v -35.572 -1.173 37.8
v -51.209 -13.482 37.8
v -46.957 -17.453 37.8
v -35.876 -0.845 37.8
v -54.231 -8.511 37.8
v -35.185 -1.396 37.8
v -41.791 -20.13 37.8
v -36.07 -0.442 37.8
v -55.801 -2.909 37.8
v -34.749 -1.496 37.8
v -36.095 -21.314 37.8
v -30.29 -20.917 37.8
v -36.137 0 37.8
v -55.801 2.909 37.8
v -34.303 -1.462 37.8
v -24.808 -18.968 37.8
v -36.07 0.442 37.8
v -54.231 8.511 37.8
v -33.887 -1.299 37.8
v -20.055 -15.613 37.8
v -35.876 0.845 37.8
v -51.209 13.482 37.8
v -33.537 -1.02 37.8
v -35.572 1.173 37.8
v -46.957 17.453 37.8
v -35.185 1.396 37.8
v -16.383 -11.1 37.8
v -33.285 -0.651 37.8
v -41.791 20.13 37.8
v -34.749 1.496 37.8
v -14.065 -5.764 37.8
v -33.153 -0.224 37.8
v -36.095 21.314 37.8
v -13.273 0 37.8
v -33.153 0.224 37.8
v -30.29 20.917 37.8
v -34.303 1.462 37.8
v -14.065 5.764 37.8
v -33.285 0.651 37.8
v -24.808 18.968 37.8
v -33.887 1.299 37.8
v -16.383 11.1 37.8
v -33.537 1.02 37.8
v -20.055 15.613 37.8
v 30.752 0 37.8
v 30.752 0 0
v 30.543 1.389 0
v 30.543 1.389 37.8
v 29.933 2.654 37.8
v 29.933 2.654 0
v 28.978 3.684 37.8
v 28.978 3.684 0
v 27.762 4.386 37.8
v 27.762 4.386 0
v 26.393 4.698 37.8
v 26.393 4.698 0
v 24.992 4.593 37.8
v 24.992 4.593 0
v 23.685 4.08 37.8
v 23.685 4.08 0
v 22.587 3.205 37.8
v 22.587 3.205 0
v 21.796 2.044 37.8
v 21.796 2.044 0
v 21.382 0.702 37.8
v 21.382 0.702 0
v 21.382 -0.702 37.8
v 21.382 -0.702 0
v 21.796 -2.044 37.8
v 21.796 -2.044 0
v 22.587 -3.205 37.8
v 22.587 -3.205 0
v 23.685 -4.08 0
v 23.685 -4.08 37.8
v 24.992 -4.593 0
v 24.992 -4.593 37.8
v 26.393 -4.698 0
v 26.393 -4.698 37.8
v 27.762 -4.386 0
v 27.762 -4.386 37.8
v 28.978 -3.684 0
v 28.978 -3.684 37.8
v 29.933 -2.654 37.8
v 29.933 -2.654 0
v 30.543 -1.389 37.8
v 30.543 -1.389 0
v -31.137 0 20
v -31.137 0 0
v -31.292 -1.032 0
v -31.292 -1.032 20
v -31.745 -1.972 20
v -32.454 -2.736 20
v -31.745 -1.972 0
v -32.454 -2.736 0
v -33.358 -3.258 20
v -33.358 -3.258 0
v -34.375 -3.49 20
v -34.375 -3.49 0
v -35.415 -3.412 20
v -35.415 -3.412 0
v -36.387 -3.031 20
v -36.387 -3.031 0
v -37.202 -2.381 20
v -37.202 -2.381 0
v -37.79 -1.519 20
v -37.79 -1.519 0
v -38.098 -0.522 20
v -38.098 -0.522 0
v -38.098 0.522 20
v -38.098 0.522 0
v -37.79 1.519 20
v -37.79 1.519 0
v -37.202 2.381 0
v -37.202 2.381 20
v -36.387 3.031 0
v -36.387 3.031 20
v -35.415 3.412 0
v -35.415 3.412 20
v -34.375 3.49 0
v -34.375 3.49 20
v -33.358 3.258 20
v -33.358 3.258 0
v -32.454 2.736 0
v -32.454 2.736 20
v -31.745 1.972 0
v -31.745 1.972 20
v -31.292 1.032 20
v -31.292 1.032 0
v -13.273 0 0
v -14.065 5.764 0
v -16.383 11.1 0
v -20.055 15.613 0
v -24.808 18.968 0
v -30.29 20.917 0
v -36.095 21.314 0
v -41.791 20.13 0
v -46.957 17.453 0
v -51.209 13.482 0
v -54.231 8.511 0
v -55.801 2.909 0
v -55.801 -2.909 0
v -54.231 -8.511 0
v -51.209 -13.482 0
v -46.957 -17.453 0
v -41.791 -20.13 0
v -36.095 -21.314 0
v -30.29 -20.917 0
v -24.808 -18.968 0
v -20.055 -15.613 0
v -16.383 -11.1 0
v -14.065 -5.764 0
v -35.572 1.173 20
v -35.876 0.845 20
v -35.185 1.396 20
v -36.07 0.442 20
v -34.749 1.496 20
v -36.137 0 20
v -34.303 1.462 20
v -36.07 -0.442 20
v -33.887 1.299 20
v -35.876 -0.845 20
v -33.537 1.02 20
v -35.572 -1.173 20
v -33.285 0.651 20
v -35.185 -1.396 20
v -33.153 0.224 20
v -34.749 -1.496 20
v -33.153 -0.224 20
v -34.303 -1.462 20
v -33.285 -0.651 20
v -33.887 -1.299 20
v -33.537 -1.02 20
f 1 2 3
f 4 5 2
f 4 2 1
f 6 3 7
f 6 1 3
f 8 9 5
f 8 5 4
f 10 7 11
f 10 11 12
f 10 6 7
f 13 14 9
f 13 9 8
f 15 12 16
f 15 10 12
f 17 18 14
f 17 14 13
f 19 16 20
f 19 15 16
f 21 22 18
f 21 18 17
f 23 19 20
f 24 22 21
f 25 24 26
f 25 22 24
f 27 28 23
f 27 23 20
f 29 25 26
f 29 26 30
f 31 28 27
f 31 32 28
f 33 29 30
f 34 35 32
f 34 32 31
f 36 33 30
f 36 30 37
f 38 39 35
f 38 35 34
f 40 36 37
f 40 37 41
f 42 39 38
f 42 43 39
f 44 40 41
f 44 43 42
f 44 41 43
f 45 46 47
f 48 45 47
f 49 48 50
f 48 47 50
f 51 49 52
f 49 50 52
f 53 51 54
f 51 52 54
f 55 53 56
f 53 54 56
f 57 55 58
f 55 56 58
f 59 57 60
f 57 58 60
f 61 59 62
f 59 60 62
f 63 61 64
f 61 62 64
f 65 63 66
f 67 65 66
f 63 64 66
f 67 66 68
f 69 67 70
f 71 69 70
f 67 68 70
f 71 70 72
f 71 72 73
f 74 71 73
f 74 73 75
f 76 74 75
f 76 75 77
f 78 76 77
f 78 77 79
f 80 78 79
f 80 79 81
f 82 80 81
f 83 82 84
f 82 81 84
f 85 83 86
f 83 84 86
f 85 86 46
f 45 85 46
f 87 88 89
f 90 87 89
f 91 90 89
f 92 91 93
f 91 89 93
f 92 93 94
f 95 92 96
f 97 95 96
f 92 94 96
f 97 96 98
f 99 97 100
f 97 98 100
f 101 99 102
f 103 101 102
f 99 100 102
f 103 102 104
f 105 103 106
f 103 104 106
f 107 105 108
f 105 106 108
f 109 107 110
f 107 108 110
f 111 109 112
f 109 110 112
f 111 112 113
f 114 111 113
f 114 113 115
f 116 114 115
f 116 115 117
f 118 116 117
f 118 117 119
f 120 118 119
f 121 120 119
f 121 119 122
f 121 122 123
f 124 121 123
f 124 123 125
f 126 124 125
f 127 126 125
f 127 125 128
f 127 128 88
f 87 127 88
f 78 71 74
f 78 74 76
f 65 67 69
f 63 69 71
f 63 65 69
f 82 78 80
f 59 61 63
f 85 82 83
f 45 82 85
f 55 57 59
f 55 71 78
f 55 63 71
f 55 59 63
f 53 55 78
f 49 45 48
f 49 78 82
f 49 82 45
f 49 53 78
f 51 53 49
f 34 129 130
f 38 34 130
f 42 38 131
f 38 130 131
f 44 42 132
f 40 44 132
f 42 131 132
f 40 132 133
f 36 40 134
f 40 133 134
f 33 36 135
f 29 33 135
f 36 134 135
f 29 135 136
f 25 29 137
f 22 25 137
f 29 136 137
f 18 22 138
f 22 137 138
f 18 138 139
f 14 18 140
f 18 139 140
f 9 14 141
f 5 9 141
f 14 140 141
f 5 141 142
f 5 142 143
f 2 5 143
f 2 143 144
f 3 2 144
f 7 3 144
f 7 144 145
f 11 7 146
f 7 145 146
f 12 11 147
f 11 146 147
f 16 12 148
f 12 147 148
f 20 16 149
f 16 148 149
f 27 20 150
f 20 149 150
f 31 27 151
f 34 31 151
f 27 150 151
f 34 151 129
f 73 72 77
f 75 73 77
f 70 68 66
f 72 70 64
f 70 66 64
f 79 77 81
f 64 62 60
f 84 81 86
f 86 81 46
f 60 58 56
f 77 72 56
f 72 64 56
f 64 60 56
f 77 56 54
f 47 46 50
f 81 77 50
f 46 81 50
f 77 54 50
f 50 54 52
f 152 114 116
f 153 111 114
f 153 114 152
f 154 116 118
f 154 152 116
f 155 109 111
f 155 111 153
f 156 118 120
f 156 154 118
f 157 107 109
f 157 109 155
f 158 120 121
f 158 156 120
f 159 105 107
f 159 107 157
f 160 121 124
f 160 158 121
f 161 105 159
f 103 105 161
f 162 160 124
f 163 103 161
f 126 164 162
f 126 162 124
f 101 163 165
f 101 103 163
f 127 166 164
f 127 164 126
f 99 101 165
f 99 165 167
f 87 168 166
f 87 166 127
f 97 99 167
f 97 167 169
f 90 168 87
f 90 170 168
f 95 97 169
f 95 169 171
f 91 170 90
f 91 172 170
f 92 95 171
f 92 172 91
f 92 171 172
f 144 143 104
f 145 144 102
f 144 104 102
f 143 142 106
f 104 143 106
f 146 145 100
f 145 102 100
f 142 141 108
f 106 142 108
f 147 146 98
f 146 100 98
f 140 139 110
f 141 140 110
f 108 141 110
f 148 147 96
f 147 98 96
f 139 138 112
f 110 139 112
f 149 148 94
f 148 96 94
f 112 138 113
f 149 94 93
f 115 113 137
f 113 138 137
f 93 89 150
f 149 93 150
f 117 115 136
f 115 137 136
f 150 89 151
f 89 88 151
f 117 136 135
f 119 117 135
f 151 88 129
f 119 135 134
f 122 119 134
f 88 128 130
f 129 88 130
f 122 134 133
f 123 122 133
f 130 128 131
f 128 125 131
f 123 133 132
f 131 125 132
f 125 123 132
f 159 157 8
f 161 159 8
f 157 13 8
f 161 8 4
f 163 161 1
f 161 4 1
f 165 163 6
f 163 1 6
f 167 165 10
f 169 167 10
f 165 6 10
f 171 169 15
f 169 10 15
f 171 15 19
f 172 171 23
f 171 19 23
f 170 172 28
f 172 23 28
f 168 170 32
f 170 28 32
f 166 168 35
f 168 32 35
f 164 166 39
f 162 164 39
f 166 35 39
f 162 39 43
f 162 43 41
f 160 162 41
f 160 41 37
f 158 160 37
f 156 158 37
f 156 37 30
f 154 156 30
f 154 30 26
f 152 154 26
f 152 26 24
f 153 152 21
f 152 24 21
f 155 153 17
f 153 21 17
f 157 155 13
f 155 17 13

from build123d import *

# Parameters (mm, degrees)
F0_R           = 21.363481
F1_DEPTH       = 37.8
F0_R_2         = 4.711426
F2_DEPTH       = 37.8
F3_D           = 3
F3_CBORE_D     = 7
F3_CBORE_DEPTH = 20


with BuildPart() as f1:
    # F0 (on Top) → F1 (new body)
    with BuildSketch(Plane.XY):
        with Locations((-34.636654, 0)):
            Circle(F0_R)
    extrude(amount=F1_DEPTH)

    # F3 (through all)
    with Locations(Plane(origin=(0, 0, 0), x_dir=(1, 0, 0), z_dir=(0, 0, -1))):
        with Locations((-34.636654, 0)):
            CounterBoreHole(F3_D / 2, F3_CBORE_D / 2, F3_CBORE_DEPTH)


with BuildPart() as f2:
    # F0 (on Top) → F2 (new body, through all)
    with BuildSketch(Plane.XY):
        with Locations((26.040697, 0)):
            Circle(F0_R_2)
    extrude(amount=F2_DEPTH)


solid = Compound([f1.part, f2.part])
